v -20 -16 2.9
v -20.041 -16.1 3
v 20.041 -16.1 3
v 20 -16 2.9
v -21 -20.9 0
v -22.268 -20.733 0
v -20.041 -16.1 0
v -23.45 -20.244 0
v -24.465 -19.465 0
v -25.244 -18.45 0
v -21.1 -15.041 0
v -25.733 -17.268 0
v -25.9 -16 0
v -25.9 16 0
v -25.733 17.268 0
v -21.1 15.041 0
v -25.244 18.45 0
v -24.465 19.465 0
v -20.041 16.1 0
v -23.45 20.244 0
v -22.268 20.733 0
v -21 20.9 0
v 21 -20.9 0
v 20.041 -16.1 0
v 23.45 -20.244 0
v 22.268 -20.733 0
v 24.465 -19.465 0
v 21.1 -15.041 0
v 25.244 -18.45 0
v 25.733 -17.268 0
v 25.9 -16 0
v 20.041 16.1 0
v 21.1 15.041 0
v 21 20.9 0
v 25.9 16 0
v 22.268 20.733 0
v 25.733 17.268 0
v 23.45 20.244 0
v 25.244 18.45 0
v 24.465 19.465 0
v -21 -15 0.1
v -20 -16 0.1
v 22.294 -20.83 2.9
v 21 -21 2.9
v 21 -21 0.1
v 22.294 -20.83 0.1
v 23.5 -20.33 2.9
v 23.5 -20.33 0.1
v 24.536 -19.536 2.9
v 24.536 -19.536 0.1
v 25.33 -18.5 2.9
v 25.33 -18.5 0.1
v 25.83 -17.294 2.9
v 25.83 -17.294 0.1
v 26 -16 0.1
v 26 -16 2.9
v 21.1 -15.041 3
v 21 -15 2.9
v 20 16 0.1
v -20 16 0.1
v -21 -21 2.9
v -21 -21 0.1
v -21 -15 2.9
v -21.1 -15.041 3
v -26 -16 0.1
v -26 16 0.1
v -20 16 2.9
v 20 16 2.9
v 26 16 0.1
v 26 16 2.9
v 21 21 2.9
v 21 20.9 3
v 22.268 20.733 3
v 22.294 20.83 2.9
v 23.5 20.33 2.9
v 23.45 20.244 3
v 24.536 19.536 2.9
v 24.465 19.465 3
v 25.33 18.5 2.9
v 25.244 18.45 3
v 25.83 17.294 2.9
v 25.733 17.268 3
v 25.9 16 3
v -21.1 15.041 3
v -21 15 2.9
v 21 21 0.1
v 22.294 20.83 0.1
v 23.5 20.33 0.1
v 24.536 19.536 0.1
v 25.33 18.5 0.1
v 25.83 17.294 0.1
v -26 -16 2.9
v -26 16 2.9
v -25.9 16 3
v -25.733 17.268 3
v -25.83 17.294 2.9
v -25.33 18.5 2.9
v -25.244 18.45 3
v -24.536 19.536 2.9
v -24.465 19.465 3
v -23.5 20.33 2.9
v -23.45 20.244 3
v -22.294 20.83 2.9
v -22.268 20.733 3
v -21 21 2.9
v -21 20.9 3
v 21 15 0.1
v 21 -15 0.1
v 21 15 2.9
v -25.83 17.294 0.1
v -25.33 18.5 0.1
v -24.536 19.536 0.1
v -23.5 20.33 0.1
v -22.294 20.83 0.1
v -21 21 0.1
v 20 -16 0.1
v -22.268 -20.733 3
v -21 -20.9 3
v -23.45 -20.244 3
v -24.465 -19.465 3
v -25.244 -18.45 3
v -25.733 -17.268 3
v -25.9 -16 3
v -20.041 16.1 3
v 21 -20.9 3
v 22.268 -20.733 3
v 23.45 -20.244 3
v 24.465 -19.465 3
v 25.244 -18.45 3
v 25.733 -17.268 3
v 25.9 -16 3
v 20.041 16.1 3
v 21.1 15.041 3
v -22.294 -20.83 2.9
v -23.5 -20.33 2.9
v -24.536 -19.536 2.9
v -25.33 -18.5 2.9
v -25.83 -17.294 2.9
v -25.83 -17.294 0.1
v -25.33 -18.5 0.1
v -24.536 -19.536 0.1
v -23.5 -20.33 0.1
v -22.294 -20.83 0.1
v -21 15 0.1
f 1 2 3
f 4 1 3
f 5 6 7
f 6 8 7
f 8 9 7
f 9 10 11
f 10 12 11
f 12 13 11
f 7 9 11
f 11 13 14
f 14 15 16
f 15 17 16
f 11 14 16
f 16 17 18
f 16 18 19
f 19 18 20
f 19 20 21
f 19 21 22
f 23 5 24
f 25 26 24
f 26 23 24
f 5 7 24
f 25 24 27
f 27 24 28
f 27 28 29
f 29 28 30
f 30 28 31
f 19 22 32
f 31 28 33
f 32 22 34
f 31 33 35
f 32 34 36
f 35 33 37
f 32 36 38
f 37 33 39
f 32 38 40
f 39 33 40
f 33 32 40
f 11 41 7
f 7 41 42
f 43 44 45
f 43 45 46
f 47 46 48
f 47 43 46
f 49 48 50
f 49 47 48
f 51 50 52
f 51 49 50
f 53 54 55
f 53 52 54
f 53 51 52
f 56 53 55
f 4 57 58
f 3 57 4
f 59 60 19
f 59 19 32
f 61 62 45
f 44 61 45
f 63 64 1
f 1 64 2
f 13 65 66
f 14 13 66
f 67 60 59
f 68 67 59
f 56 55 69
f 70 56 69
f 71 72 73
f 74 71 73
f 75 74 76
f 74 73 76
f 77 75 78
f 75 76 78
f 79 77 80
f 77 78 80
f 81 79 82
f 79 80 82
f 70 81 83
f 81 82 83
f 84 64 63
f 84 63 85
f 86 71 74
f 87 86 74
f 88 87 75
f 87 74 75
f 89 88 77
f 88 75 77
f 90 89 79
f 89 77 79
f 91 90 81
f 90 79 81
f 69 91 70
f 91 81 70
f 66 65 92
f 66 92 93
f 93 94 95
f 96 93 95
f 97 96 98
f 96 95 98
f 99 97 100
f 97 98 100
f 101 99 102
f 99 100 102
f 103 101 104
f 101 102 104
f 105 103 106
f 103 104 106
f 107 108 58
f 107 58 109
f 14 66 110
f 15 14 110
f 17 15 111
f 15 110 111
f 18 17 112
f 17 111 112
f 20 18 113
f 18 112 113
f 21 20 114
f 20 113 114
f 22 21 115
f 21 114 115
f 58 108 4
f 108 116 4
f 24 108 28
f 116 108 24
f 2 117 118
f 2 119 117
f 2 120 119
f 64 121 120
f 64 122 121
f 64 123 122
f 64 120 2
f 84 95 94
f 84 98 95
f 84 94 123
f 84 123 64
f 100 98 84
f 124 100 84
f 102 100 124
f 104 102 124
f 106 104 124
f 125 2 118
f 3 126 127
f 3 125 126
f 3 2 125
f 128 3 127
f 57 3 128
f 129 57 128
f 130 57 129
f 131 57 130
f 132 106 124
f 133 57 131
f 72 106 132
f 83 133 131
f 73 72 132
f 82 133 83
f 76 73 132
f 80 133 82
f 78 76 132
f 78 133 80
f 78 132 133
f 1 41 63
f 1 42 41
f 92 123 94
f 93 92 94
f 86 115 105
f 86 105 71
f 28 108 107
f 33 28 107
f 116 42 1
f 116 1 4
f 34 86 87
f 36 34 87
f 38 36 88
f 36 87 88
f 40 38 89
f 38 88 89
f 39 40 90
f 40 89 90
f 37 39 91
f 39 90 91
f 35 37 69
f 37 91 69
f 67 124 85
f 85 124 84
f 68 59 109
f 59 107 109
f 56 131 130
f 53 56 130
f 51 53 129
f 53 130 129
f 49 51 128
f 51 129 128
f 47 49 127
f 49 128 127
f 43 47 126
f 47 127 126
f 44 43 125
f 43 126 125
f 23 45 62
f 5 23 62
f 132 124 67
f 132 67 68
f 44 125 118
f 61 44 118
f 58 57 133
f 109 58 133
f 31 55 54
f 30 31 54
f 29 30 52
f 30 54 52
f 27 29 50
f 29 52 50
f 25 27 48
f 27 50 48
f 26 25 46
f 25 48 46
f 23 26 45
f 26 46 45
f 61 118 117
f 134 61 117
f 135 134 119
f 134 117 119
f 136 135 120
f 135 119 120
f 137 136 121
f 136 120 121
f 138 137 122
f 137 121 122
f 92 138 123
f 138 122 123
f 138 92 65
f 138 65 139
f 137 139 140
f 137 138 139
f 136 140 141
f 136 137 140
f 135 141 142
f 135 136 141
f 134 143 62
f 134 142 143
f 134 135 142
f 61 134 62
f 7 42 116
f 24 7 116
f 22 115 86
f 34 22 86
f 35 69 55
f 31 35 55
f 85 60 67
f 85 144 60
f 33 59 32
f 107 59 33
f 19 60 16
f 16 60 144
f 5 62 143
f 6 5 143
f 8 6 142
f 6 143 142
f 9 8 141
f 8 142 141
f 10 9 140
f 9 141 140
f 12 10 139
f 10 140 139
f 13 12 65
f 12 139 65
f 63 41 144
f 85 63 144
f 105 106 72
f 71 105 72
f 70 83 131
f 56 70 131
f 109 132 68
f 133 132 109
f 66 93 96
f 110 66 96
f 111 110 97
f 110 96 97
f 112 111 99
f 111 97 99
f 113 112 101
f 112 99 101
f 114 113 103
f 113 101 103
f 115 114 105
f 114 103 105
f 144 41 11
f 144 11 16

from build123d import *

# Parameters (mm, degrees)
F0_W     = 52
F0_H     = 42
F0_W_2   = 42
F0_H_2   = 32
F1_DEPTH = 3
F2_R     = 5
F3_SIZE2 = 1
F3_SIZE  = 1
F4_SIZE  = 1
F5_SIZE  = 0.1


with BuildPart() as f1:
    # F0 (on Top) → F1 (new body)
    with BuildSketch(Plane.XY):
        Rectangle(F0_W, F0_H)
        Rectangle(F0_W_2, F0_H_2, mode=Mode.SUBTRACT)
    extrude(amount=F1_DEPTH)

    # F2
    f2_edges = [f1.edges().sort_by_distance(p)[0] for p in [
        (-26, 21, 1.5),
        (-26, -21, 1.5),
        (26, -21, 1.5),
        (26, 21, 1.5),
    ]]
    fillet(f2_edges, radius=F2_R)

    # F3
    f3_edges = [f1.edges().sort_by_distance(p)[0] for p in [
        (-21, 16, 1.5),
    ]]
    chamfer(f3_edges, length=F3_SIZE, length2=F3_SIZE2)

    # F4
    f4_edges = [f1.edges().sort_by_distance(p)[0] for p in [
        (21, 16, 1.5),
        (21, -16, 1.5),
        (-21, -16, 1.5),
    ]]
    chamfer(f4_edges, length=F4_SIZE)

    # F5
    f5_edges = [f1.edges().sort_by_distance(p)[0] for p in [
        (-21, 0, 3),
        (-20.5, -15.5, 3),
        (-20.5, 15.5, 3),
        (0, -16, 3),
        (0, 16, 3),
        (20.5, -15.5, 3),
        (20.5, 15.5, 3),
        (21, 0, 3),
        (0, 21, 3),
        (24.535534, 19.535534, 3),
        (-24.535534, 19.535534, 3),
        (26, 0, 3),
        (-26, 0, 3),
        (24.535534, -19.535534, 3),
        (-24.535534, -19.535534, 3),
        (0, -21, 3),
        (-21, 0, 0),
        (-20.5, -15.5, 0),
        (-20.5, 15.5, 0),
        (0, -16, 0),
        (0, 16, 0),
        (20.5, -15.5, 0),
        (20.5, 15.5, 0),
        (21, 0, 0),
        (0, 21, 0),
        (24.535534, 19.535534, 0),
        (-24.535534, 19.535534, 0),
        (26, 0, 0),
        (-26, 0, 0),
        (24.535534, -19.535534, 0),
        (-24.535534, -19.535534, 0),
        (0, -21, 0),
    ]]
    chamfer(f5_edges, length=F5_SIZE)


solid = f1.part
